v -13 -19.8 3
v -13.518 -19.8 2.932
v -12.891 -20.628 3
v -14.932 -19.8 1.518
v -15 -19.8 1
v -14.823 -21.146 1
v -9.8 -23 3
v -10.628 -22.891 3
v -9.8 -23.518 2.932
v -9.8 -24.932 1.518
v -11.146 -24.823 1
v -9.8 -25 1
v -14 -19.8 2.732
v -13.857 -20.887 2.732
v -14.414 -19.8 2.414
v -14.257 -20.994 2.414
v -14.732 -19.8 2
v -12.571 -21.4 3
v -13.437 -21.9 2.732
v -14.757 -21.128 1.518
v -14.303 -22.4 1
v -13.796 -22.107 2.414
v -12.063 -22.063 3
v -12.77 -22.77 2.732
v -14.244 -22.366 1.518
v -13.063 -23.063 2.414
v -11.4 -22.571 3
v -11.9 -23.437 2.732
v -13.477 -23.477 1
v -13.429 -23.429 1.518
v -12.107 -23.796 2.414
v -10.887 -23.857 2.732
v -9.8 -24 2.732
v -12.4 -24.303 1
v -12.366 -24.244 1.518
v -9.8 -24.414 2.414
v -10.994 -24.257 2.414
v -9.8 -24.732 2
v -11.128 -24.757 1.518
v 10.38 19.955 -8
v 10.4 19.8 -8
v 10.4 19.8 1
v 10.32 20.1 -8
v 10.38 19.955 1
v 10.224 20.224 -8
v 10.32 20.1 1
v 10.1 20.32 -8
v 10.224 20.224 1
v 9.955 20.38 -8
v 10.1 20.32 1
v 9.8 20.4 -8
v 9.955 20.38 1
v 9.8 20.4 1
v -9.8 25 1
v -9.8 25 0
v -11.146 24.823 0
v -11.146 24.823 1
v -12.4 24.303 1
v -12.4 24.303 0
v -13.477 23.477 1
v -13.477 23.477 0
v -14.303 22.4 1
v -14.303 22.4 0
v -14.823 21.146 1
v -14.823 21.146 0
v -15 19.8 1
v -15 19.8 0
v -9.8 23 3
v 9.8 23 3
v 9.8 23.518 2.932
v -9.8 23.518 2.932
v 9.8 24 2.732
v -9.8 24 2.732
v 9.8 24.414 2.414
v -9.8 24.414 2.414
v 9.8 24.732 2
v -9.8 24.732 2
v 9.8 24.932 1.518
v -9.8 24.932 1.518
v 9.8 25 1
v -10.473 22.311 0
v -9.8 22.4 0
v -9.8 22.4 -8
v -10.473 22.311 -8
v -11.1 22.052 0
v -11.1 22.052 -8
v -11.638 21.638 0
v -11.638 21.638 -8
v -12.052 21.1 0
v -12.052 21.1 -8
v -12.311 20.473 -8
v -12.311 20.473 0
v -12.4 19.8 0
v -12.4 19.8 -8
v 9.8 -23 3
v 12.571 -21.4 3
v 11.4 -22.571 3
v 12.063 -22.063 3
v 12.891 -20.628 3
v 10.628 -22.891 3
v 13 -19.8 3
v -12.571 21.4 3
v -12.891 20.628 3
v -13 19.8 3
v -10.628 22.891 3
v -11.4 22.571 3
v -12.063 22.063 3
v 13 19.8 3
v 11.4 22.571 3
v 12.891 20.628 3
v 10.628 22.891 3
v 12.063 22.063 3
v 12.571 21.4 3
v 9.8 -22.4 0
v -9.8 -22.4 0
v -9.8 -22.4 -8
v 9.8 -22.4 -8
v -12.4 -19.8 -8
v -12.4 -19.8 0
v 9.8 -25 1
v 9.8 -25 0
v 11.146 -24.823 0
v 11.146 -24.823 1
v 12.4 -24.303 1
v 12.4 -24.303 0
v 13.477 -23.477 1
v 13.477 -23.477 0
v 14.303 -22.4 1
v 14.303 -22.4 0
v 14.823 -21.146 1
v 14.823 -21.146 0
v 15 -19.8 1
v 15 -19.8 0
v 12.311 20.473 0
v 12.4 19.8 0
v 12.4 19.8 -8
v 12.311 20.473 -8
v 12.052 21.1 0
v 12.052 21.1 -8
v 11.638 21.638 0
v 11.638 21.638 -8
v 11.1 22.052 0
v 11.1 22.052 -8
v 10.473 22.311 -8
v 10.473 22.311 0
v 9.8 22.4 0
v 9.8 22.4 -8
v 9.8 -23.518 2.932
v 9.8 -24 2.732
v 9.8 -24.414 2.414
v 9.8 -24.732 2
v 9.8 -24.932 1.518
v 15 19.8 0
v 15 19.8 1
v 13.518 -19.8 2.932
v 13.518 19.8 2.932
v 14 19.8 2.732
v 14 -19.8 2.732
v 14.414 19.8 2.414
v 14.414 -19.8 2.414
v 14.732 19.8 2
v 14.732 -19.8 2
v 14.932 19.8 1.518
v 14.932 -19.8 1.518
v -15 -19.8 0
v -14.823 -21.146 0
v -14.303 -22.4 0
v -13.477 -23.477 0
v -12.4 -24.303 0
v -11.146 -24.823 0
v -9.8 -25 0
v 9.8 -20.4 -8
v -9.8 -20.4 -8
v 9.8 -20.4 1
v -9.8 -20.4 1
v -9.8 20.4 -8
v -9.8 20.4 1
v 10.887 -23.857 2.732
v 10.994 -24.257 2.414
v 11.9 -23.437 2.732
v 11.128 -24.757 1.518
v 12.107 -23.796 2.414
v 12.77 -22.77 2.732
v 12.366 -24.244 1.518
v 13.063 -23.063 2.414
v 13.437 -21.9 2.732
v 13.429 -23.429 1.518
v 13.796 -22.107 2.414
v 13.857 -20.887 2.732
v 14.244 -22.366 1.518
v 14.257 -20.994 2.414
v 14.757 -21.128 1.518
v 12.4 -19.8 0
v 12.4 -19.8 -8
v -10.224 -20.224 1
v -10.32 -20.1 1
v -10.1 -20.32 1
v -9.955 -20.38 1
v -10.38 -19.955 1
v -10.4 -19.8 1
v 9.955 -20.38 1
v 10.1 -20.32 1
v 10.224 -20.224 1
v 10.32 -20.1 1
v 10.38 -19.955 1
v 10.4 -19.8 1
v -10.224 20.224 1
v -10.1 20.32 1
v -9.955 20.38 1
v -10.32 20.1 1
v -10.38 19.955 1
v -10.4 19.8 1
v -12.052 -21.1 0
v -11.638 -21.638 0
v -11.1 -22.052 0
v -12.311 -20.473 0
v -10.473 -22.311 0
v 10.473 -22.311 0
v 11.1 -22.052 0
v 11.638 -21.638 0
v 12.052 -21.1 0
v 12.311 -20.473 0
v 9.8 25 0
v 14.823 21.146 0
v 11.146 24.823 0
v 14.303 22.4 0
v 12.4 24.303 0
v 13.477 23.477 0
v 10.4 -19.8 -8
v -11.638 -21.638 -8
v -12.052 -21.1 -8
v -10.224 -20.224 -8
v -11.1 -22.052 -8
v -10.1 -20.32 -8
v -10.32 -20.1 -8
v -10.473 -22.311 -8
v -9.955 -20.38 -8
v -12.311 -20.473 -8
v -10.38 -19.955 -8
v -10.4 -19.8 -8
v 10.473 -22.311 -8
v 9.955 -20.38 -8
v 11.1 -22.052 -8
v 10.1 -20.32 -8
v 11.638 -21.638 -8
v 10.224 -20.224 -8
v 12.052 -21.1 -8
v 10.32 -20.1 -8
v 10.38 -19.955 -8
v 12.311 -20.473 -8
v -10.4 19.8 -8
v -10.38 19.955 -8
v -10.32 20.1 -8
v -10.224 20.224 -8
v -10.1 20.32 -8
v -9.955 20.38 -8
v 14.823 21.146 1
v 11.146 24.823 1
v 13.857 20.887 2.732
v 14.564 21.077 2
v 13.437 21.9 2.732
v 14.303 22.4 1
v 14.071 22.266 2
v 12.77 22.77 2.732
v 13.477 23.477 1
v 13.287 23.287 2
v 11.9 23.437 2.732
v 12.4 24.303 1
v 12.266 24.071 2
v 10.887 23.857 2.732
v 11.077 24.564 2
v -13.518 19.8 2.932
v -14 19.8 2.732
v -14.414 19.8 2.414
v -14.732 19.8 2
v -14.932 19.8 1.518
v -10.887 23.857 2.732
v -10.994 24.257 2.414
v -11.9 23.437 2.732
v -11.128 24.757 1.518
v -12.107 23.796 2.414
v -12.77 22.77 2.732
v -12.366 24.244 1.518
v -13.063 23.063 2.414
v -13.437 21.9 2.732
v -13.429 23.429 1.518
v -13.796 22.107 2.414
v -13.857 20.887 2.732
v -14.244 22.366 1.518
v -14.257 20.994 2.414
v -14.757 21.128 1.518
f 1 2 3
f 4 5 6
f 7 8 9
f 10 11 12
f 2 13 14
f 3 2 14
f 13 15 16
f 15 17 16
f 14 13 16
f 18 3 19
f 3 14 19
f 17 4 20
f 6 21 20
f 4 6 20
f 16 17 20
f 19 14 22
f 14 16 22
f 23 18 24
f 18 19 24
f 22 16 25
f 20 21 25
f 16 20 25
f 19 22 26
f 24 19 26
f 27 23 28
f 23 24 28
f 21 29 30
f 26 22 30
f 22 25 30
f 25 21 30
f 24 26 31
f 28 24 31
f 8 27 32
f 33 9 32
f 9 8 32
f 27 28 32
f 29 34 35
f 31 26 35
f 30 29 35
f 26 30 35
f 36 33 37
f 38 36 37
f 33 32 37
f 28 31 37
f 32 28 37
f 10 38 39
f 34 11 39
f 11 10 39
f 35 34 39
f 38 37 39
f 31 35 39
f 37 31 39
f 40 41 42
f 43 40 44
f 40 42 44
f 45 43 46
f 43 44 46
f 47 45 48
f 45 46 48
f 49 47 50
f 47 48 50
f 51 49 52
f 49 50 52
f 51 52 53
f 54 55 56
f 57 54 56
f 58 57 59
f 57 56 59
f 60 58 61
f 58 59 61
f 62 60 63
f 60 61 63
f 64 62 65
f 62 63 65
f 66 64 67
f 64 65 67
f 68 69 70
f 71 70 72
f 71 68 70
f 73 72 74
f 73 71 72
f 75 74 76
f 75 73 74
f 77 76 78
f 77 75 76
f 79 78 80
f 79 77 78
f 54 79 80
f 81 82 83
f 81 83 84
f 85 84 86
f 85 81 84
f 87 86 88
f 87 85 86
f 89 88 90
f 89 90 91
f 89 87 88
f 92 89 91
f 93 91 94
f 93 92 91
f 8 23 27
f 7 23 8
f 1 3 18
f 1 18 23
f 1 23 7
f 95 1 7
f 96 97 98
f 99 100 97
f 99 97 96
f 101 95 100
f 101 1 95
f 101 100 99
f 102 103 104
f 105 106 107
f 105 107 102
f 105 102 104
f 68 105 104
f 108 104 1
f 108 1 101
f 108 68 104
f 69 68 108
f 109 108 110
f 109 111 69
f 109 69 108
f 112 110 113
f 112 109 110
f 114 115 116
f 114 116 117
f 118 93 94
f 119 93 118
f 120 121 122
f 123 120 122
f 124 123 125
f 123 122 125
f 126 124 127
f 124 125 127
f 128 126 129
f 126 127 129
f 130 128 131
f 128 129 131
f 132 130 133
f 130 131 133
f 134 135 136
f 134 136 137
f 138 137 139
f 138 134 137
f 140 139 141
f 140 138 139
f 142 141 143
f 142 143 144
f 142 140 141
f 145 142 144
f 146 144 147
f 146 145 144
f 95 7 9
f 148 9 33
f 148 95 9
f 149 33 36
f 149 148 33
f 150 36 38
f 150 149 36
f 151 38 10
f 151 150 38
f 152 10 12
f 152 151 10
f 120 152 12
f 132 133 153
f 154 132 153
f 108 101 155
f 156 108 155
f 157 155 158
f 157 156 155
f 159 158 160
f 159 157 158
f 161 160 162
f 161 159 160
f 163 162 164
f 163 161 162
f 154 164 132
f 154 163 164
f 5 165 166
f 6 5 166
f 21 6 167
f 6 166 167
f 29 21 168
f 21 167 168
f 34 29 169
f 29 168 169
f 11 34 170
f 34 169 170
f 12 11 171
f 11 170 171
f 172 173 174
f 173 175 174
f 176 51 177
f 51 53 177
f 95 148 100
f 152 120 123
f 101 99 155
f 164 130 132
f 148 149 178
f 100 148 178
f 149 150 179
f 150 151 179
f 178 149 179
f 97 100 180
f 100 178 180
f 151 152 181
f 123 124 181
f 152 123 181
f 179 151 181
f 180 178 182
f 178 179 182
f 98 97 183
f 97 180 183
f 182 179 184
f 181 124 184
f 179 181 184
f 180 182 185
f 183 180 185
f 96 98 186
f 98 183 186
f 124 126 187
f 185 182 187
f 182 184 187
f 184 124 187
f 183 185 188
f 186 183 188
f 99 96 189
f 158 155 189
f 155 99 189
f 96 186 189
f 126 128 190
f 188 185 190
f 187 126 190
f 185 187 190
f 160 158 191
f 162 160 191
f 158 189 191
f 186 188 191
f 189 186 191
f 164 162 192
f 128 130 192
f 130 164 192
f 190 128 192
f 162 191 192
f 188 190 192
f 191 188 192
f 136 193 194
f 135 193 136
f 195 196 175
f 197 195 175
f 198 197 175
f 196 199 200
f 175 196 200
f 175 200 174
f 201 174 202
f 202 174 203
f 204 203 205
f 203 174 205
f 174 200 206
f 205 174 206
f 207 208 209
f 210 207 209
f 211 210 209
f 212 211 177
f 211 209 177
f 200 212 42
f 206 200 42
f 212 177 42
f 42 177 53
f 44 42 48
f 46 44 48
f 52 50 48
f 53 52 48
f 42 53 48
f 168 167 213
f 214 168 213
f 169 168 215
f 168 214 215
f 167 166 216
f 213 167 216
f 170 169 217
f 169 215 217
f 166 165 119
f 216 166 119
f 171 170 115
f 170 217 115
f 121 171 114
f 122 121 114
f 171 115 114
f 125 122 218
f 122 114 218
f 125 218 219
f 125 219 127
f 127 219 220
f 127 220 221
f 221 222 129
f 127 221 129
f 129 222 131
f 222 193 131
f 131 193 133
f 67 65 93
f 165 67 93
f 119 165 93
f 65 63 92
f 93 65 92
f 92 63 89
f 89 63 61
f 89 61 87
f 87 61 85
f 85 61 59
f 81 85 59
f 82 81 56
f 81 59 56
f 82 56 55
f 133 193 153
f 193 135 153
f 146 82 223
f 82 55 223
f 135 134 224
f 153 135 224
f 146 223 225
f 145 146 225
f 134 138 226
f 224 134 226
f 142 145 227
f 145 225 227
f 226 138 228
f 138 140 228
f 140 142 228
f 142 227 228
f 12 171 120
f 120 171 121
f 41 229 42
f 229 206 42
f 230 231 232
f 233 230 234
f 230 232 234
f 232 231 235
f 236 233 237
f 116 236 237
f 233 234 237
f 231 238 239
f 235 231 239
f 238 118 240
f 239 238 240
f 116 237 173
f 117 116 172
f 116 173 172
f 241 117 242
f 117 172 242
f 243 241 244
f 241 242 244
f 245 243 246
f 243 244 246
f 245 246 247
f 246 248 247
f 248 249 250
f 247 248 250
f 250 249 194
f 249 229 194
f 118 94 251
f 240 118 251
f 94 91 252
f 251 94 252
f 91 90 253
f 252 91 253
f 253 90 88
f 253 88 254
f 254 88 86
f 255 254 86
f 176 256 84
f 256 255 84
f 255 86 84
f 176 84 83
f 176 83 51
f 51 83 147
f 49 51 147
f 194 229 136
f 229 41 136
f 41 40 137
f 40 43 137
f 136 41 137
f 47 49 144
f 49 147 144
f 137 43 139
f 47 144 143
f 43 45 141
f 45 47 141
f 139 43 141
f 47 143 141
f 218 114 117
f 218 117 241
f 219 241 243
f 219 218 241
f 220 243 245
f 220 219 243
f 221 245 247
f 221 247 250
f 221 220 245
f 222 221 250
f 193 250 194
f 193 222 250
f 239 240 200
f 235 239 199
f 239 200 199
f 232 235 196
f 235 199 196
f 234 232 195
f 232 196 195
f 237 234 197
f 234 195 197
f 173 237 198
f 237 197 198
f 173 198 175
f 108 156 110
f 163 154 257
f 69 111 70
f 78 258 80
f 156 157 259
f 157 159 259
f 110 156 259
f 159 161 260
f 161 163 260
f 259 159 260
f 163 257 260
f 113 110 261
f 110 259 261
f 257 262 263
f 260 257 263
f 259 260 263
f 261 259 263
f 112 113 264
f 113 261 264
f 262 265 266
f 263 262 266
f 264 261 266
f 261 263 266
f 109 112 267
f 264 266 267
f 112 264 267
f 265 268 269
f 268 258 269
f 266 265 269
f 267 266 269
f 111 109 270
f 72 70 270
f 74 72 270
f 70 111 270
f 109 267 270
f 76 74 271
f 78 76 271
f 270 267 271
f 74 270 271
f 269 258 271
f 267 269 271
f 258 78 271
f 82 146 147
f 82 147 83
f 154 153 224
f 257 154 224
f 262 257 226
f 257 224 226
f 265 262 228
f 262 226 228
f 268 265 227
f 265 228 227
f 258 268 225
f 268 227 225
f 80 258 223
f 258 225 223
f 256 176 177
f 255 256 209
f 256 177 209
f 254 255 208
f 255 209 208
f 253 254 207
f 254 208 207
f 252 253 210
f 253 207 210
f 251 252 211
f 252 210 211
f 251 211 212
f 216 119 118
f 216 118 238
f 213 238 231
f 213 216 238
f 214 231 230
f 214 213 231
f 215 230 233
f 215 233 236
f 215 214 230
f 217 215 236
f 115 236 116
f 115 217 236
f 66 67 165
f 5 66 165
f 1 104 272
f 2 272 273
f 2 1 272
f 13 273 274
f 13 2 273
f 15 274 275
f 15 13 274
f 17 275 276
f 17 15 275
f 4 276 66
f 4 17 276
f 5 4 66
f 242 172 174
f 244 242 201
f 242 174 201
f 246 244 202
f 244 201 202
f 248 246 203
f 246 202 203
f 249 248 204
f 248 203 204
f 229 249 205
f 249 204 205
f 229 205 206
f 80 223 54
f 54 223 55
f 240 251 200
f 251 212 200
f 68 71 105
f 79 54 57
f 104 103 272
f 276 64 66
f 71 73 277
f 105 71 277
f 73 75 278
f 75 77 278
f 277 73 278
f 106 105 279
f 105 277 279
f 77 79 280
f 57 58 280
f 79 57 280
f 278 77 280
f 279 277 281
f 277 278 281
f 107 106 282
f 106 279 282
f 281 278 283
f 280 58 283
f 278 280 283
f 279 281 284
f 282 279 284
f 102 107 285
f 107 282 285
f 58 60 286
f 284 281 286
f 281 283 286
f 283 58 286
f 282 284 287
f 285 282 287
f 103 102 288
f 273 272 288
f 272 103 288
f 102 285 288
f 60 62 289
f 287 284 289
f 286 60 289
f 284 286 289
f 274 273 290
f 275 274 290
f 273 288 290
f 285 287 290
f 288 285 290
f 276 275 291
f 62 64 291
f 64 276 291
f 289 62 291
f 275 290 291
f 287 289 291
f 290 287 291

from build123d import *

# Parameters (mm, degrees)
BOSS_EXTRUDE1_DEPTH = 8
BOSS_EXTRUDE3_DEPTH = 3
FILLET1_R           = 2
SHELL1_T            = -2


with BuildPart() as part:
    # Sketch1 → Boss-Extrude1 (new body)
    with BuildSketch(Plane.XY):
        with BuildLine():
            Line((-9.8, -22.4), (9.8, -22.4))
            ThreePointArc((9.8, -22.4), (11.638477631, -21.638477631), (12.4, -19.8))
            Line((12.4, -19.8), (12.4, 19.8))
            ThreePointArc((12.4, 19.8), (11.638477631, 21.638477631), (9.8, 22.4))
            Line((9.8, 22.4), (-9.8, 22.4))
            ThreePointArc((-9.8, 22.4), (-11.638477631, 21.638477631), (-12.4, 19.8))
            Line((-12.4, 19.8), (-12.4, -19.8))
            ThreePointArc((-12.4, -19.8), (-11.638477631, -21.638477631), (-9.8, -22.4))
        make_face()
    extrude(amount=-BOSS_EXTRUDE1_DEPTH)

    # Sketch3 → Boss-Extrude3 (add)
    with BuildSketch(Plane.XY):
        with BuildLine():
            Line((-9.8, -25), (9.8, -25))
            ThreePointArc((9.8, -25), (13.476955262, -23.476955262), (15, -19.8))
            Line((15, -19.8), (15, 19.8))
            ThreePointArc((15, 19.8), (13.476955262, 23.476955262), (9.8, 25))
            Line((9.8, 25), (-9.8, 25))
            ThreePointArc((-9.8, 25), (-13.476955262, 23.476955262), (-15, 19.8))
            Line((-15, 19.8), (-15, -19.8))
            ThreePointArc((-15, -19.8), (-13.476955262, -23.476955262), (-9.8, -25))
        make_face()
    extrude(amount=BOSS_EXTRUDE3_DEPTH)

    # Fillet1
    fillet1_edges = [part.edges().sort_by_distance(p)[0] for p in [
        (13.476955262, 23.476955262, 3),
        (0, 25, 3),
        (-13.476955262, 23.476955262, 3),
        (-15, 0, 3),
        (-13.476955262, -23.476955262, 3),
        (0, -25, 3),
        (13.476955262, -23.476955262, 3),
        (15, 0, 3),
    ]]
    fillet(fillet1_edges, radius=FILLET1_R)

    # Shell1
    shell1_openings = [part.faces().sort_by_distance(p)[0] for p in [
        (0, 0, -8),
    ]]
    offset(amount=SHELL1_T, openings=shell1_openings, kind=Kind.INTERSECTION)


solid = part.part
